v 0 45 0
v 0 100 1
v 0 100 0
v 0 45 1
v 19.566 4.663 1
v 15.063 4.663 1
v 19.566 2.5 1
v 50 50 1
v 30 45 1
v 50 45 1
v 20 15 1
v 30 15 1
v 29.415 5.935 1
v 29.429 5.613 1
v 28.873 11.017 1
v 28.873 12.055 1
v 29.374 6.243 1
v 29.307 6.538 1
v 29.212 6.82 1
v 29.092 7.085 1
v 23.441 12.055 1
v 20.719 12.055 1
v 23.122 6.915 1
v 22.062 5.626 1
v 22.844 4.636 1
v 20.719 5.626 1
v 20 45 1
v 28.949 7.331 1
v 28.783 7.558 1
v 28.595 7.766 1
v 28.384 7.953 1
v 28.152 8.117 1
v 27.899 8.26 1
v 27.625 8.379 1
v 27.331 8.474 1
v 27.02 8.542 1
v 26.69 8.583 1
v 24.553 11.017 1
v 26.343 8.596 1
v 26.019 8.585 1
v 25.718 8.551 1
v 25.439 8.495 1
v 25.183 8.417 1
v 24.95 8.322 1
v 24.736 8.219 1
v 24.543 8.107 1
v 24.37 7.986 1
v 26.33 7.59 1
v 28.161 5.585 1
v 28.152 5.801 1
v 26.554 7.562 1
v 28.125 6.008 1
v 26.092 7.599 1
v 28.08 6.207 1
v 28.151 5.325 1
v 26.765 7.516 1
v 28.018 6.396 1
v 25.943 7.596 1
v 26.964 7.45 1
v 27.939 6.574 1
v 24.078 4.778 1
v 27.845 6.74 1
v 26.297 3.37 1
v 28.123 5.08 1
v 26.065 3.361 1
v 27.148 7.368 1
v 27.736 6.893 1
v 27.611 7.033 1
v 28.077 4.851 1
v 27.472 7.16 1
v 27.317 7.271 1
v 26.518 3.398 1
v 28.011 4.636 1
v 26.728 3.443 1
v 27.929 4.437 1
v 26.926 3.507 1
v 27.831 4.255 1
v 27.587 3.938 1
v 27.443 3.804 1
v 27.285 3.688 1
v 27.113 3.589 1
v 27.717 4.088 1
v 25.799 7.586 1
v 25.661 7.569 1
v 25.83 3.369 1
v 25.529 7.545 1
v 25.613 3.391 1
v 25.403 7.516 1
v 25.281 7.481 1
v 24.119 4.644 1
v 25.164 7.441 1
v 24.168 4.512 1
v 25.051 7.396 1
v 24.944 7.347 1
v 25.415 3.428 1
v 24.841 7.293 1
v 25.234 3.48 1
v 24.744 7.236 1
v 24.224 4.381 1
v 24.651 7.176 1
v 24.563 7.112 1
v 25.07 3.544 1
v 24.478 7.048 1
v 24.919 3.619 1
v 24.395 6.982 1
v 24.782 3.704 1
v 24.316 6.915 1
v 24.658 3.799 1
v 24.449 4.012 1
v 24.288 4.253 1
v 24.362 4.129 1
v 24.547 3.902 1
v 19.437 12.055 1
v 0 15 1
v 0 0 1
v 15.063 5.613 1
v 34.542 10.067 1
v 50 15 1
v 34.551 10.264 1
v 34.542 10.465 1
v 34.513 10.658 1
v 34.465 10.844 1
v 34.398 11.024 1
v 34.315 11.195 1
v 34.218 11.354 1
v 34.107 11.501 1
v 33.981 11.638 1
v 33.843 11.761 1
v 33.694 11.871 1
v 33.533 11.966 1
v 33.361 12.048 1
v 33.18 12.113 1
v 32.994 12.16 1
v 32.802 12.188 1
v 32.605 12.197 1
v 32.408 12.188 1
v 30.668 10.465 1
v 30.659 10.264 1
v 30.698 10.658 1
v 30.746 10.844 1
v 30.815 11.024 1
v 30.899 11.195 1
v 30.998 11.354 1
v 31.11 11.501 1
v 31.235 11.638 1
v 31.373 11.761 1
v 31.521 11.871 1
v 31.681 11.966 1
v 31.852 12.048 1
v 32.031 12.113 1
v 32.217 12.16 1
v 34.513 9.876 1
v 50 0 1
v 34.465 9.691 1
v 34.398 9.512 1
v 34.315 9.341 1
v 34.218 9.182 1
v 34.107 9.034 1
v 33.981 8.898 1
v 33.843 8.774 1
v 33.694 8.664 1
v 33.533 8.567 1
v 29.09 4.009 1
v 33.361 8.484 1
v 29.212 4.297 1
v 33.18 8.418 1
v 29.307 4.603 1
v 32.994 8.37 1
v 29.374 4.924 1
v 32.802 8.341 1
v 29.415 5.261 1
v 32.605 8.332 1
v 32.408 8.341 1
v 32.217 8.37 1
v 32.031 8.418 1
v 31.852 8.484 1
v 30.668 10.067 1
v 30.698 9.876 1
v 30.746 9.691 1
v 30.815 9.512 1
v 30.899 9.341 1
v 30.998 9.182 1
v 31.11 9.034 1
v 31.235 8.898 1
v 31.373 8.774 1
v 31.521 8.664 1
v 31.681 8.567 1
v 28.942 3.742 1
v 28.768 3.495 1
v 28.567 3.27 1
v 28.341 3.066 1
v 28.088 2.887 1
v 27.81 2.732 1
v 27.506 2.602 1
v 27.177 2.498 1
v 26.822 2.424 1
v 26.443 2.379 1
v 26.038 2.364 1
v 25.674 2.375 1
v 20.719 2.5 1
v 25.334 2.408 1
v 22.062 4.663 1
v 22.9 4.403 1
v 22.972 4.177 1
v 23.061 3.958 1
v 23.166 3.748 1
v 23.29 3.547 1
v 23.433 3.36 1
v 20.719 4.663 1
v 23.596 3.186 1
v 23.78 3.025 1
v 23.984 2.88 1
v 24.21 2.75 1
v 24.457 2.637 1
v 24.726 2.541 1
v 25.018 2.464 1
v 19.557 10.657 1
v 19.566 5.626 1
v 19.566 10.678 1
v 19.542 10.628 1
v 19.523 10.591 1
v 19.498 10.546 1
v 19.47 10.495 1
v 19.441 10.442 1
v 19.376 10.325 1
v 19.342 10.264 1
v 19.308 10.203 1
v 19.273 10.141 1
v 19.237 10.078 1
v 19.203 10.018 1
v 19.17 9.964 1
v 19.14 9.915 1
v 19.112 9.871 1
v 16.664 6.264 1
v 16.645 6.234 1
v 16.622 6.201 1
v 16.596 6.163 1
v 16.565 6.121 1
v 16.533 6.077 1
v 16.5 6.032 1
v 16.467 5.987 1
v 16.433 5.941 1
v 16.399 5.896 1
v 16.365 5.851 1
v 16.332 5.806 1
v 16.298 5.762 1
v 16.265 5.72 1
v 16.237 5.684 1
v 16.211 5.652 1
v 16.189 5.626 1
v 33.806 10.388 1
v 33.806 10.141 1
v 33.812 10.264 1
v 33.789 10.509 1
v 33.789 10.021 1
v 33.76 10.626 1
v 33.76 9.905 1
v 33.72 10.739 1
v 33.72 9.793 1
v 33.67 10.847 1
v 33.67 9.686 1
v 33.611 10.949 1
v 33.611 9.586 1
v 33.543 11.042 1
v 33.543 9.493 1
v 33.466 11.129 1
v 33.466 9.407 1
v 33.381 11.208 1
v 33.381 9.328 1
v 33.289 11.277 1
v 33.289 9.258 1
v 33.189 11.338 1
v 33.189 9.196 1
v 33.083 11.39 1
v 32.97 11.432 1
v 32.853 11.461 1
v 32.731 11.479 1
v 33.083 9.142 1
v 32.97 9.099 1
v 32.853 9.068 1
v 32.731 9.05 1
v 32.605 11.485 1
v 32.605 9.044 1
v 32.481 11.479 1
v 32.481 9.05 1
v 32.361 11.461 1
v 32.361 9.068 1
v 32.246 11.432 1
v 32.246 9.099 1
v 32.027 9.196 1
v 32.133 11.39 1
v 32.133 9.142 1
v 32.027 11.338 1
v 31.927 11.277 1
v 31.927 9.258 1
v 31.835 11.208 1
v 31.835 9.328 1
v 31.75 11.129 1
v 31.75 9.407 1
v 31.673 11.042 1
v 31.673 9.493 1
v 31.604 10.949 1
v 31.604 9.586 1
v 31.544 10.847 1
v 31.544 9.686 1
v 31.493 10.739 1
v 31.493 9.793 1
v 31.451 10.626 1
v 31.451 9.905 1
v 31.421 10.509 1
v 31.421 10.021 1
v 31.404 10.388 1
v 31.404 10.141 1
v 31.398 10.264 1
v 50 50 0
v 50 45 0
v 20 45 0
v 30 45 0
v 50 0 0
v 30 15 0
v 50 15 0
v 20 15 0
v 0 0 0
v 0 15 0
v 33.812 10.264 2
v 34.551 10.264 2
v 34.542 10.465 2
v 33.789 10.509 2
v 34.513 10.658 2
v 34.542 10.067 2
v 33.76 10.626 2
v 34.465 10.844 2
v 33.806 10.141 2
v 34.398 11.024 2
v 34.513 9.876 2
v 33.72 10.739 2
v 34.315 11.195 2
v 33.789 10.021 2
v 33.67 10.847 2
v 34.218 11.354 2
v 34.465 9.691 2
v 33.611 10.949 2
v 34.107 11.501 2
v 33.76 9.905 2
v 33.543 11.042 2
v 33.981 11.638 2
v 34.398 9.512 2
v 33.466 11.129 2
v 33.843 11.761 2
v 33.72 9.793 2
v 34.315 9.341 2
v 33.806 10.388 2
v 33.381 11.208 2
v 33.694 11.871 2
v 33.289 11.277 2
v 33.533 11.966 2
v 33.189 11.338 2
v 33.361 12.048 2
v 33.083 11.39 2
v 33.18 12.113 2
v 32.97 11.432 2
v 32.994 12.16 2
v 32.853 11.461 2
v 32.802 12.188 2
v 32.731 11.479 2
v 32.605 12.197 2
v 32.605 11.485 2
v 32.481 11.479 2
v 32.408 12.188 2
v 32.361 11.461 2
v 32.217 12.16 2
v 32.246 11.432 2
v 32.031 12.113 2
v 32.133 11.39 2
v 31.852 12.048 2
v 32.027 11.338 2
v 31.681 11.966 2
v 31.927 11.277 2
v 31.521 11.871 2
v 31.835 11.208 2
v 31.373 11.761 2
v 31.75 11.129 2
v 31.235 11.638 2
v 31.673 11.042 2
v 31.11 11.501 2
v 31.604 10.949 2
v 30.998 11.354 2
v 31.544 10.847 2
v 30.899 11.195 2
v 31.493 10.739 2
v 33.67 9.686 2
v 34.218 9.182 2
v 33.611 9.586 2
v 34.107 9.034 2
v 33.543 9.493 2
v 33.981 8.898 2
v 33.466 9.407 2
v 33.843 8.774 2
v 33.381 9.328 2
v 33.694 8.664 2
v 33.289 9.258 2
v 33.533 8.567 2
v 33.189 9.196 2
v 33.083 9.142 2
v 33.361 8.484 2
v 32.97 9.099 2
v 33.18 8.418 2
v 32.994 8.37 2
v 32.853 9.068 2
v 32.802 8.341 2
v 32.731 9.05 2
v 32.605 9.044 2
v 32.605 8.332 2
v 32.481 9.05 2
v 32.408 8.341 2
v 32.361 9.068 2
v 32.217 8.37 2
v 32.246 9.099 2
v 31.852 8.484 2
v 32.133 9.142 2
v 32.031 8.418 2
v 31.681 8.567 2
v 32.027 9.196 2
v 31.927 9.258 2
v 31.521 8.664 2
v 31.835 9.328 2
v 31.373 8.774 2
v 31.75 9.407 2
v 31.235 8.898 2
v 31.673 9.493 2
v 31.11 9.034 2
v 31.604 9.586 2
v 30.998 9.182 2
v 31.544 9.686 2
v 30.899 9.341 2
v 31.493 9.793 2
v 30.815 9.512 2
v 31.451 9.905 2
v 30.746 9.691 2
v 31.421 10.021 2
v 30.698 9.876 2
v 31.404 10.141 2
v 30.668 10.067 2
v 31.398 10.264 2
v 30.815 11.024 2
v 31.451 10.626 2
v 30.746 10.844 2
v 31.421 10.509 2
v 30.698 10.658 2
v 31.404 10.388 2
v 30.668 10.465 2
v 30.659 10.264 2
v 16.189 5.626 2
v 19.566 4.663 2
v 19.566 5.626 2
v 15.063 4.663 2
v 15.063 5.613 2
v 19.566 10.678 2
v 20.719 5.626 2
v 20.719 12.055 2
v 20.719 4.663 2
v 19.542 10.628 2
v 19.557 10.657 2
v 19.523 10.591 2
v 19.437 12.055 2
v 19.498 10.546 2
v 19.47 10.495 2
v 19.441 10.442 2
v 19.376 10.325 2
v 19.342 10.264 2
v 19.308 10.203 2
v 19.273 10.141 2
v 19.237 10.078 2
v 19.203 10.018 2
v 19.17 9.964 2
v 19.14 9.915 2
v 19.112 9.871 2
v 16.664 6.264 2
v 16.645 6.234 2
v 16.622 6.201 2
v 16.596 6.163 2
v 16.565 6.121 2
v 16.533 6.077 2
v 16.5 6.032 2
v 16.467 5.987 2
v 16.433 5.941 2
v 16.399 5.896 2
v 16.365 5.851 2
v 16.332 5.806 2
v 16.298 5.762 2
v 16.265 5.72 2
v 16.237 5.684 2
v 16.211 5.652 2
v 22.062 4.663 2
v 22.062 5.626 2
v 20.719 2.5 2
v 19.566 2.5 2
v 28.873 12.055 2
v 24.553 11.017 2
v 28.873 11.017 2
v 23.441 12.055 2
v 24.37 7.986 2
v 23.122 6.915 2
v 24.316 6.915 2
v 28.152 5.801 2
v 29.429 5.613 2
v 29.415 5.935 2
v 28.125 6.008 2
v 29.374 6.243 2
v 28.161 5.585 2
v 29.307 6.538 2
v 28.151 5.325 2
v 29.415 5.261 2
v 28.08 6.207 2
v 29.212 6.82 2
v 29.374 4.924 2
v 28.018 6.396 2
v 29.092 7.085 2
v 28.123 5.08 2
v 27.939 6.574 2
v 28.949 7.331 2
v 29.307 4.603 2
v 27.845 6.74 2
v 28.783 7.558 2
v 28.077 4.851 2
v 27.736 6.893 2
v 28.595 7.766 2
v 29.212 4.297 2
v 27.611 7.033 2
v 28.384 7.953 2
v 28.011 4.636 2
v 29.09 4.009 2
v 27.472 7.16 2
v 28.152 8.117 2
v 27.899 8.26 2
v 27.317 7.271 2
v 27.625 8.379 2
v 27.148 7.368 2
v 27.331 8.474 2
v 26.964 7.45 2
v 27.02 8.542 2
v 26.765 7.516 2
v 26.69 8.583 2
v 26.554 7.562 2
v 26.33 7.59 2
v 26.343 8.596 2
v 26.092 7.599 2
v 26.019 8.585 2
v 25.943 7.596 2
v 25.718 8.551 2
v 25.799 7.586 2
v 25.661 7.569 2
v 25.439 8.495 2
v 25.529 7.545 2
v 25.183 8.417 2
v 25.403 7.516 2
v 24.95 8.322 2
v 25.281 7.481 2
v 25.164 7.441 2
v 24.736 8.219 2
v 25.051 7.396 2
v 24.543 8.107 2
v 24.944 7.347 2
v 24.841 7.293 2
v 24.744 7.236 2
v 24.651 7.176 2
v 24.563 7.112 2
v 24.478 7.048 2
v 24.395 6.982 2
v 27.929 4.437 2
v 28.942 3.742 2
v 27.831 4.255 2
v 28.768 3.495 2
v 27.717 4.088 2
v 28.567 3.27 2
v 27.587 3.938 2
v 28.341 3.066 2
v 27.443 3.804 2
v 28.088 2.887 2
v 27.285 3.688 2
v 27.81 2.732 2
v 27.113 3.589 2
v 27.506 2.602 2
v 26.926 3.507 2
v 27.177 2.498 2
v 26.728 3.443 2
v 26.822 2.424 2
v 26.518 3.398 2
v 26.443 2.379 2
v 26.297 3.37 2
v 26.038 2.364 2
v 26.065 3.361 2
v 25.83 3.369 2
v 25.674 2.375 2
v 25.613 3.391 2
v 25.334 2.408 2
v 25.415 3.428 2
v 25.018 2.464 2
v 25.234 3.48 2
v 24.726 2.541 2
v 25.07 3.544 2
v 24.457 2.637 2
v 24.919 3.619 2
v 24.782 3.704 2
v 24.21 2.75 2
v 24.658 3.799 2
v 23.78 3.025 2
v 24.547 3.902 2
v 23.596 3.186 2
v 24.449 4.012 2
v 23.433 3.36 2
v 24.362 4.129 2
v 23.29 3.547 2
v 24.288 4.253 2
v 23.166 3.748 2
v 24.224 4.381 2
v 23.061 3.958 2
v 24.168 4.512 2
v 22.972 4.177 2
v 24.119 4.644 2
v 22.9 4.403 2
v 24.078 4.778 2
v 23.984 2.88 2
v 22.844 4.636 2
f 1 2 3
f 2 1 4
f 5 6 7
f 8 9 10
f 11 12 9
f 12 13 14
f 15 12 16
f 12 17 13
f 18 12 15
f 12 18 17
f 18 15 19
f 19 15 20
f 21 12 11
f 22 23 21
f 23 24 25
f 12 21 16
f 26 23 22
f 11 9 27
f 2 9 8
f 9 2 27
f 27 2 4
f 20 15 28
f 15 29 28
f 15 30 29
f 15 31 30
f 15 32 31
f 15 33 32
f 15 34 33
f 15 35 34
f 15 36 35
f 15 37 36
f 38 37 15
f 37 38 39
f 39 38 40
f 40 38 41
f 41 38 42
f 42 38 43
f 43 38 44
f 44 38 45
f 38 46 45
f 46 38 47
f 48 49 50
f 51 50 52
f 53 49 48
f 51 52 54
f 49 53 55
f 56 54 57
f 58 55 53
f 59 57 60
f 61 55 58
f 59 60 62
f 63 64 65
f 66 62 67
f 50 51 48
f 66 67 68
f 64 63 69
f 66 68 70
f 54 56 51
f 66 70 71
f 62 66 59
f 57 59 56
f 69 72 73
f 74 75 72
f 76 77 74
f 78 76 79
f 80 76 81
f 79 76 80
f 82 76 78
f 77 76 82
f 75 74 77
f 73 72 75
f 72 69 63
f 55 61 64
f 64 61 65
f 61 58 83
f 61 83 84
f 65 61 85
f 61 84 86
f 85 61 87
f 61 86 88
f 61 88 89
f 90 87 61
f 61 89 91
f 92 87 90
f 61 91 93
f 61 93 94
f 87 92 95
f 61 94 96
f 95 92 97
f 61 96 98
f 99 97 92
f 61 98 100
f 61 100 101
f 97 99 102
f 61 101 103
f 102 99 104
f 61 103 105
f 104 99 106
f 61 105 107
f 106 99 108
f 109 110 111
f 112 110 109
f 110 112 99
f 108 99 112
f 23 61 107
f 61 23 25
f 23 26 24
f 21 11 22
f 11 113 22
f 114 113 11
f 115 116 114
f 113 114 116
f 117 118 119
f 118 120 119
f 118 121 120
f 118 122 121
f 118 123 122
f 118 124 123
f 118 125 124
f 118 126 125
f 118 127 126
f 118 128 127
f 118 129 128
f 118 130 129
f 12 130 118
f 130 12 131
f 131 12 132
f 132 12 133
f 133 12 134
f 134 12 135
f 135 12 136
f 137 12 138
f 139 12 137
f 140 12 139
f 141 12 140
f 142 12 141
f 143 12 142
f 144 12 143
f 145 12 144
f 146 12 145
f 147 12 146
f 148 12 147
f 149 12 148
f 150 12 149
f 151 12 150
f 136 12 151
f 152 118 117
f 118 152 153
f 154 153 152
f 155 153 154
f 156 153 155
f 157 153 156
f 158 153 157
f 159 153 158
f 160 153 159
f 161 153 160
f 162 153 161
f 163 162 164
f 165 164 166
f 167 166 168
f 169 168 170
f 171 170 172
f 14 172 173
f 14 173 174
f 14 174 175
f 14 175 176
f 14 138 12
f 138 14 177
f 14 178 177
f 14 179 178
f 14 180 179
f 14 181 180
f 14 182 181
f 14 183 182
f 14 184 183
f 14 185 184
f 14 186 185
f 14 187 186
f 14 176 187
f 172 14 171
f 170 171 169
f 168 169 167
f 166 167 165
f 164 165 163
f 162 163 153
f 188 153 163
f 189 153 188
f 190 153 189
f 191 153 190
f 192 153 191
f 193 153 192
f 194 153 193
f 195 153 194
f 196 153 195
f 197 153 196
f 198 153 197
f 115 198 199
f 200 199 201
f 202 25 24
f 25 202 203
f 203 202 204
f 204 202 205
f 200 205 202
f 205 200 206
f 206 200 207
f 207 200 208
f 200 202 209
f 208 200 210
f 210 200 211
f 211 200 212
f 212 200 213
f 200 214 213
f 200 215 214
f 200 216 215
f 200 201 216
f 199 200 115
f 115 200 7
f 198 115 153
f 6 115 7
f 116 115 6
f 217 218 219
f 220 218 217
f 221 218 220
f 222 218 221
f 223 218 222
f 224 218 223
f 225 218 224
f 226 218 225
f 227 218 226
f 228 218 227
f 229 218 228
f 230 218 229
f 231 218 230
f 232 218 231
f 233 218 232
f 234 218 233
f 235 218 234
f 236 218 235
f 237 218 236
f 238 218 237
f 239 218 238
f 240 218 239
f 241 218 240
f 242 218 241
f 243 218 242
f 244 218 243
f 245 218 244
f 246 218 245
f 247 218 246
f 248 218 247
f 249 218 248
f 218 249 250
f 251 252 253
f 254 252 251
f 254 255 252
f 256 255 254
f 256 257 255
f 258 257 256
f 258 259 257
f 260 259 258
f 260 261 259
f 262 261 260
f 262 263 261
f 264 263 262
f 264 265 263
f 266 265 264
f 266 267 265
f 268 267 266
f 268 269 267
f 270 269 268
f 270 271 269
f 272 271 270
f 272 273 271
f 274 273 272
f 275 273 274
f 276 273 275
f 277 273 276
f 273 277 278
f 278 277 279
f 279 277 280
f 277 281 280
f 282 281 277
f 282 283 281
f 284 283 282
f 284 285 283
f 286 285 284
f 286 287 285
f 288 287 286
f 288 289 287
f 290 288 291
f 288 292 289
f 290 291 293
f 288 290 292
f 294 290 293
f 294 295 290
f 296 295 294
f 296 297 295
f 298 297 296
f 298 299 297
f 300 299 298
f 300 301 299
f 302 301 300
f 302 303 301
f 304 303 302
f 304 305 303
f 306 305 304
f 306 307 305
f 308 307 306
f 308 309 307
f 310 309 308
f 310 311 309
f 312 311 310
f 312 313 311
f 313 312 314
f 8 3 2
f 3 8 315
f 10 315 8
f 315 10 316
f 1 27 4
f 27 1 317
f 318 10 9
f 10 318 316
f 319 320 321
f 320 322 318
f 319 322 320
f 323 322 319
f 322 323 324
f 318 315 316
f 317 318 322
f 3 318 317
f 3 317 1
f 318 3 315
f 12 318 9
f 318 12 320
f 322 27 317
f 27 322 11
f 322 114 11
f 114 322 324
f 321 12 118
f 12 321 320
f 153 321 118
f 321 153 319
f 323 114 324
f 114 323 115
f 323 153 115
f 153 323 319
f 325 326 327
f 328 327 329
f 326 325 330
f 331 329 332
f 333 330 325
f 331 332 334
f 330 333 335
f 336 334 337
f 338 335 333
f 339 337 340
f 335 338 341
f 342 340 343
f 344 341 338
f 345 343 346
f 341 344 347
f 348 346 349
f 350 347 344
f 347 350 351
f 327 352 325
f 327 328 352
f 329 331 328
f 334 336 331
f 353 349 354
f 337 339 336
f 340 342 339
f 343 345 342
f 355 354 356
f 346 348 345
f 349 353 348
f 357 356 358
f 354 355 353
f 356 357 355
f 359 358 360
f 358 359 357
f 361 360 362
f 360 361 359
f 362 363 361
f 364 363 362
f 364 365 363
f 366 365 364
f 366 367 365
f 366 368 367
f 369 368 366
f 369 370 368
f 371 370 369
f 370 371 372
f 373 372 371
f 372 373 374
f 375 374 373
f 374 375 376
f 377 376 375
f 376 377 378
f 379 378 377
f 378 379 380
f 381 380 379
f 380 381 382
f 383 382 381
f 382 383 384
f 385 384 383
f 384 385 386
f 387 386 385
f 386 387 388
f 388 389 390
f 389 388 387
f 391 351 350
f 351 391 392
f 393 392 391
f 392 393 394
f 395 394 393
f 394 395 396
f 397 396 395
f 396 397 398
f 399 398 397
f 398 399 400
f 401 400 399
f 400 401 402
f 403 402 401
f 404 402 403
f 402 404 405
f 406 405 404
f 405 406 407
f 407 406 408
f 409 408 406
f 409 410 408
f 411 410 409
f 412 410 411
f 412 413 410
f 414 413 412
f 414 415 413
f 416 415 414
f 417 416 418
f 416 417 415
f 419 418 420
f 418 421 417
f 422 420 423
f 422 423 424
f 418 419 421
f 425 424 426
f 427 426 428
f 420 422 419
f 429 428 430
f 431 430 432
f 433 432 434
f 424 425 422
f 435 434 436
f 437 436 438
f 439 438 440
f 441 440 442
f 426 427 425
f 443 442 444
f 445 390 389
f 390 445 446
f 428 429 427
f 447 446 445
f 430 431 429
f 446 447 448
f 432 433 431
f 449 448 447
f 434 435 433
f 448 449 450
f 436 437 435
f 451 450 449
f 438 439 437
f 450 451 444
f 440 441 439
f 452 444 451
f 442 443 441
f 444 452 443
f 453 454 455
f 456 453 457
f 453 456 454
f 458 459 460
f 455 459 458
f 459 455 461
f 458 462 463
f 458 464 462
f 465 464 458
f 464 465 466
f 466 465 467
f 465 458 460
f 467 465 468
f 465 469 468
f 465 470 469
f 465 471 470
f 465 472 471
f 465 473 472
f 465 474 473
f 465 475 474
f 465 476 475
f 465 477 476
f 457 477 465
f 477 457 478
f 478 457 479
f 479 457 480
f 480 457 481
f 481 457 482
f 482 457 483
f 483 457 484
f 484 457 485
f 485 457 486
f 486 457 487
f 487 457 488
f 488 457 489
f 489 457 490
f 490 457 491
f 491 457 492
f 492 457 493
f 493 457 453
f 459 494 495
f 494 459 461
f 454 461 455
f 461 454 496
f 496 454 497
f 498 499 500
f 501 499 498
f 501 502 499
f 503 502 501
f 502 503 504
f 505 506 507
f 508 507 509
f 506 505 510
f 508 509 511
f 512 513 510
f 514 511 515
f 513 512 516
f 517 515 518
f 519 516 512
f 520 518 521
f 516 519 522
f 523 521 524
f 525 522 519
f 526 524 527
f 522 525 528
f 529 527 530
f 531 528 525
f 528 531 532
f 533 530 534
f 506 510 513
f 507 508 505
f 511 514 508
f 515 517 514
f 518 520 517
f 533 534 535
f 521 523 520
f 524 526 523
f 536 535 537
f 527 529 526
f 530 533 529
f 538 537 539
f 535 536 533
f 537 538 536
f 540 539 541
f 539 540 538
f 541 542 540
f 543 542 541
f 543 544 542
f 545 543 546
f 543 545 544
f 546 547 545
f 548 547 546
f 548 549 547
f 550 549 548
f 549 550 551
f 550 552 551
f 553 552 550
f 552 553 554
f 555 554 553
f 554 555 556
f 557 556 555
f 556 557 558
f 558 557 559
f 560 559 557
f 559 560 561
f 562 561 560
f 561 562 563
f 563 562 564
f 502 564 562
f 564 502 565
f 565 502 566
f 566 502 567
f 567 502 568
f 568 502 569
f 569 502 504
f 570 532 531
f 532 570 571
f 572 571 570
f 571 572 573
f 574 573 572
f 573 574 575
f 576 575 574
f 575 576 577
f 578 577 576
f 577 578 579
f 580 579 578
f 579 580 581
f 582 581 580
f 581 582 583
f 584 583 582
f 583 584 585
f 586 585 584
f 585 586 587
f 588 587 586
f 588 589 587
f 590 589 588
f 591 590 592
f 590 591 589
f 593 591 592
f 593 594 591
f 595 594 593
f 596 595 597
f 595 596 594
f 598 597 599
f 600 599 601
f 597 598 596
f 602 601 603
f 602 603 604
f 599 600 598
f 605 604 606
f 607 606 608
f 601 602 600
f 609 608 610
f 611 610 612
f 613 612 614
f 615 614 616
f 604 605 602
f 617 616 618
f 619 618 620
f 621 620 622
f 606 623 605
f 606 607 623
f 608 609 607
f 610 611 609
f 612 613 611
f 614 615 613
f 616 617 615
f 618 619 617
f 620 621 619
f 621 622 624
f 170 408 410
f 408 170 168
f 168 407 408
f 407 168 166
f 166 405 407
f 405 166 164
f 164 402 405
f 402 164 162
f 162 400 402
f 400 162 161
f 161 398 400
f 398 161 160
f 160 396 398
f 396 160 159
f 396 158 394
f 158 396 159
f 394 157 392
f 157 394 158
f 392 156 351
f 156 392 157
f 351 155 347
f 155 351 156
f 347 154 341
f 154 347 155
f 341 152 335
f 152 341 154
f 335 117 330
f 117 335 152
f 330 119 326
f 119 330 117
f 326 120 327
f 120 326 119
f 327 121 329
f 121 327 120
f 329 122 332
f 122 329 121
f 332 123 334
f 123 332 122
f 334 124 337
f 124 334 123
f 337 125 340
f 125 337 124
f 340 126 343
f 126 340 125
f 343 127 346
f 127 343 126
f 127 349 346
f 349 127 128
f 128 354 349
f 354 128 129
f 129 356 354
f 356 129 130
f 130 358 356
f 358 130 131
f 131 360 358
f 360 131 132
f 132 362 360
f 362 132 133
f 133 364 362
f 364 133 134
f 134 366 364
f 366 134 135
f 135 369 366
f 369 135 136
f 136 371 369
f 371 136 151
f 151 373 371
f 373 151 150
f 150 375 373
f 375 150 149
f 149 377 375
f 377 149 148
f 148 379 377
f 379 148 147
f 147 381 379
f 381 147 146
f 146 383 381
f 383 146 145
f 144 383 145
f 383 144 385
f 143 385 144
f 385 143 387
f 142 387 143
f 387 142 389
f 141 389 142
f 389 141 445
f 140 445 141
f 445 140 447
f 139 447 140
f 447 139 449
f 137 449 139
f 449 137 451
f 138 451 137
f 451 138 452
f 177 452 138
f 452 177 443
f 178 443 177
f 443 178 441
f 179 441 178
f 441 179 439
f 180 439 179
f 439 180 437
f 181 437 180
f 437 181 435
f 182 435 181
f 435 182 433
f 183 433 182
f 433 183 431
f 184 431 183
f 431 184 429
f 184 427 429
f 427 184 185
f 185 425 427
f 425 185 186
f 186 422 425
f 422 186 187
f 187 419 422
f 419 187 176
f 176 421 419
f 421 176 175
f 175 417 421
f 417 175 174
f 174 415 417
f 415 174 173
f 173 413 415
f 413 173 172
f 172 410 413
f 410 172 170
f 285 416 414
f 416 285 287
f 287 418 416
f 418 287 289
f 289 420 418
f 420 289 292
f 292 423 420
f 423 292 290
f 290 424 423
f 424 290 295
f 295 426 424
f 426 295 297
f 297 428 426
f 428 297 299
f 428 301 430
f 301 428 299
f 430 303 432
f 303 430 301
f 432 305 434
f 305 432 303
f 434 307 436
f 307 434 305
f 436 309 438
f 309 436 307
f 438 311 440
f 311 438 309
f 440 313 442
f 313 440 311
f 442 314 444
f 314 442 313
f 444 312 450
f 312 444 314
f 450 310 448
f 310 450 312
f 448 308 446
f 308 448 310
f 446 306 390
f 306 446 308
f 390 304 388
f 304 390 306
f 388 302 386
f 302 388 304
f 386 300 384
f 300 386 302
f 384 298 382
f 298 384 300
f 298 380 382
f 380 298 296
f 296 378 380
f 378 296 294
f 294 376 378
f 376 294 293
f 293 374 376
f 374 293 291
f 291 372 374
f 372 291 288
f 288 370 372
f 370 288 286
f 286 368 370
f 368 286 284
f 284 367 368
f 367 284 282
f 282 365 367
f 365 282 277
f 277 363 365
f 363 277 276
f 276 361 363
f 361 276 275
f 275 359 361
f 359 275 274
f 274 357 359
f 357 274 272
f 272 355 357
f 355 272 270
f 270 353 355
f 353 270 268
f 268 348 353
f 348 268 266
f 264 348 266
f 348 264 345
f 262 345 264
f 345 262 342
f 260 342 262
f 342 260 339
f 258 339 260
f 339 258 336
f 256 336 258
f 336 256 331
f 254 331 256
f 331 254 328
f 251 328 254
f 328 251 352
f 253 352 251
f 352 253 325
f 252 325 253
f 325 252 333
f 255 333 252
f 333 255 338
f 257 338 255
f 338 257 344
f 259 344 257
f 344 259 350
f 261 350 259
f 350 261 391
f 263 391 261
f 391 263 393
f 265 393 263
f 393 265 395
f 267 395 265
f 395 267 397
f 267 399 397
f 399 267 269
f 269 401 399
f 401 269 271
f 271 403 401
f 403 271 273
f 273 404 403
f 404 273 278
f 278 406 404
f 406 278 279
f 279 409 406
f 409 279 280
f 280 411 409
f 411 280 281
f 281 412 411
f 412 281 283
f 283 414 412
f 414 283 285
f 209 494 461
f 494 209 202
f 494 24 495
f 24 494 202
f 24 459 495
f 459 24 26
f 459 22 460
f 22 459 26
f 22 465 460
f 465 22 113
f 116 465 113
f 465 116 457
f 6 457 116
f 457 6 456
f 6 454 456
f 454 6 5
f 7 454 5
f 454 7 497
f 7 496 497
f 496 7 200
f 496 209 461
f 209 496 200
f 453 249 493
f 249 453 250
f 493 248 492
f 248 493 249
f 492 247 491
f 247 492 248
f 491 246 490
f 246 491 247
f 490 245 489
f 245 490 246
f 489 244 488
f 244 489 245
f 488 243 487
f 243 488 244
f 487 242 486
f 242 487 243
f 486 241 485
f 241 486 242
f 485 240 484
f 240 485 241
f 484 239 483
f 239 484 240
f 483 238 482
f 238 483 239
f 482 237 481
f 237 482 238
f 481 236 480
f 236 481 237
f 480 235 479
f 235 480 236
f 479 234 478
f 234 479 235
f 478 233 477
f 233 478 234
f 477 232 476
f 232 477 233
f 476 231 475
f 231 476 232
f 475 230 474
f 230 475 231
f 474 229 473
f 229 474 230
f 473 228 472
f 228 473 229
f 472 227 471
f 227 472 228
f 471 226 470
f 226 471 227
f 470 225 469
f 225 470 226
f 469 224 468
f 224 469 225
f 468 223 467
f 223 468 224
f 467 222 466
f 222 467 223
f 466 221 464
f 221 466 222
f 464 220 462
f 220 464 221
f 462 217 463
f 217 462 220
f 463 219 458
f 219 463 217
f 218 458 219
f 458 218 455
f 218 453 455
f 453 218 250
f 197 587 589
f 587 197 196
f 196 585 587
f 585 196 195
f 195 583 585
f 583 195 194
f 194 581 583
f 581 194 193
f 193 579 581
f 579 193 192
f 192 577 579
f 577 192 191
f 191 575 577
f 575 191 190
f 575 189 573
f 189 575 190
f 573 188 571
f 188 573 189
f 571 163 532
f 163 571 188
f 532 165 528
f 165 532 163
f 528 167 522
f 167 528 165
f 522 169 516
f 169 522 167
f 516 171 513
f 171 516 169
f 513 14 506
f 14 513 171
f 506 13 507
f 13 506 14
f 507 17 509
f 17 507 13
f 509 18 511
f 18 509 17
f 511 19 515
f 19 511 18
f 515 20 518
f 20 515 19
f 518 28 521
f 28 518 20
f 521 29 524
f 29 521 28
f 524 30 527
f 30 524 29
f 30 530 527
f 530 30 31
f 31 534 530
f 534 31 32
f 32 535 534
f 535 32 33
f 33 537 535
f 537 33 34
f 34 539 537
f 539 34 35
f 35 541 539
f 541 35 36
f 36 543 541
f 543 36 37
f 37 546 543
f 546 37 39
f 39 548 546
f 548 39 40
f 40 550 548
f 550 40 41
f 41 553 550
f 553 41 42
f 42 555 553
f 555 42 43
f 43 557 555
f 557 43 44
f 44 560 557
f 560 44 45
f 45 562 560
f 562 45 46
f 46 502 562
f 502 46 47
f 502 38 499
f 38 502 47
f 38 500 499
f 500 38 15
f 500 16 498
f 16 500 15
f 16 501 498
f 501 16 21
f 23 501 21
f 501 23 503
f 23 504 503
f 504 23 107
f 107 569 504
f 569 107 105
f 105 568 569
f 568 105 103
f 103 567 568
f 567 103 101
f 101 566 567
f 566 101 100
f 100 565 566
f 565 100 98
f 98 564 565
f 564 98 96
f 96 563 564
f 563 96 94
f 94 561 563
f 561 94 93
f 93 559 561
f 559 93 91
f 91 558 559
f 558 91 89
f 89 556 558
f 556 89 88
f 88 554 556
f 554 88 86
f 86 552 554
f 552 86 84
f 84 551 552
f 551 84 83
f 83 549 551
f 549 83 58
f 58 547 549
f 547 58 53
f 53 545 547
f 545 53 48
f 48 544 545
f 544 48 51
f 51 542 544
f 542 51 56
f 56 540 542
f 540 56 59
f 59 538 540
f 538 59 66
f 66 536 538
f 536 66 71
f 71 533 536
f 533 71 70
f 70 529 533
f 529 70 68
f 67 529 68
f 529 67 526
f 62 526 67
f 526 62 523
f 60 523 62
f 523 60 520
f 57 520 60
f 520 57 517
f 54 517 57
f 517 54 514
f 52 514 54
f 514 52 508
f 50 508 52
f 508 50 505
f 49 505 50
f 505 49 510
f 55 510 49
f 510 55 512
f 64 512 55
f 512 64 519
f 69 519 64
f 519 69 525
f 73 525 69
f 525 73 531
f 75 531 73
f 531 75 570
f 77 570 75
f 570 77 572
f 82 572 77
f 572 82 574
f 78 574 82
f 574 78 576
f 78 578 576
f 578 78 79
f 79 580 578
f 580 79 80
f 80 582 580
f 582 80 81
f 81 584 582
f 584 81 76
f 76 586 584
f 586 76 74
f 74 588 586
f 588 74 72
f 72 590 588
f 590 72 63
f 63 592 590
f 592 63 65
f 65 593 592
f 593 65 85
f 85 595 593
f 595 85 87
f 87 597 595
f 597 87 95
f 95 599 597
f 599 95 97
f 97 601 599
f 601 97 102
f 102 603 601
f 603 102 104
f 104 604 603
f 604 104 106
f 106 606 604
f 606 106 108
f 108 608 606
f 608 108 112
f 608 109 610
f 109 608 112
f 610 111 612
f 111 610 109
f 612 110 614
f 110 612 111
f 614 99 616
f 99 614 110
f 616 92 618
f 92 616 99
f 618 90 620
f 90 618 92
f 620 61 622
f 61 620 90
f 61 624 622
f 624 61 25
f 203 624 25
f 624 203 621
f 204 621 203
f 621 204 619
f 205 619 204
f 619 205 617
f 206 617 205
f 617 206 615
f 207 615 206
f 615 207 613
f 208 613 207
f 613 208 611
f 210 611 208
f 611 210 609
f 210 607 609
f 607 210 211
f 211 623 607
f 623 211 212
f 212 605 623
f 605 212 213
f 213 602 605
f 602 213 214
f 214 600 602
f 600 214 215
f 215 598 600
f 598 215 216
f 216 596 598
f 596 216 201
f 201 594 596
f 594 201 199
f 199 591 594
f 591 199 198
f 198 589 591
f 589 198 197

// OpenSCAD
// Degree of the ruler
degree=45; //[15:80]

// Width of the ruler
width=50;

// Length of the connector between alignment base and angled ruler
connector_length=30;

// Thickness of the ruler.
thickness=1;

/* [Text] */

// Do you want to add degree as text to the ruler
show_text = 1; //[1:Yes,0:No]

// Thinckness of the text
text_thickness = 1;

/* [Advanced] */

// Length of the base that helps with alignment.
base_length = 15;

// Width of the base to angled ruler connector
connector_width = 10;

// Notch on the side of the ruler. Helps to maintain ruler alignment. Additionally, it helps while printing as extremely thin parts do not print good enough.
ruler_notch = 5;

/* [Hidden] */

translate([0, connector_length+base_length, 0])
linear_extrude(thickness)
polygon([
    [0,0], 
    [width,0],
    [width, ruler_notch],
    [0,ruler_notch+tan(degree)*width]
]);

//Connector
translate([(width-connector_width)/2,base_length,0])
cube([connector_width,connector_length,thickness]);

//Base
cube([width,base_length,thickness]);

//Text
if(show_text) {
    translate([width/2, base_length/3/2, 0])
    linear_extrude(thickness+text_thickness)
    scale([base_length/15, base_length/15, 1])
    text(str(degree, "°"), halign="center");
}
